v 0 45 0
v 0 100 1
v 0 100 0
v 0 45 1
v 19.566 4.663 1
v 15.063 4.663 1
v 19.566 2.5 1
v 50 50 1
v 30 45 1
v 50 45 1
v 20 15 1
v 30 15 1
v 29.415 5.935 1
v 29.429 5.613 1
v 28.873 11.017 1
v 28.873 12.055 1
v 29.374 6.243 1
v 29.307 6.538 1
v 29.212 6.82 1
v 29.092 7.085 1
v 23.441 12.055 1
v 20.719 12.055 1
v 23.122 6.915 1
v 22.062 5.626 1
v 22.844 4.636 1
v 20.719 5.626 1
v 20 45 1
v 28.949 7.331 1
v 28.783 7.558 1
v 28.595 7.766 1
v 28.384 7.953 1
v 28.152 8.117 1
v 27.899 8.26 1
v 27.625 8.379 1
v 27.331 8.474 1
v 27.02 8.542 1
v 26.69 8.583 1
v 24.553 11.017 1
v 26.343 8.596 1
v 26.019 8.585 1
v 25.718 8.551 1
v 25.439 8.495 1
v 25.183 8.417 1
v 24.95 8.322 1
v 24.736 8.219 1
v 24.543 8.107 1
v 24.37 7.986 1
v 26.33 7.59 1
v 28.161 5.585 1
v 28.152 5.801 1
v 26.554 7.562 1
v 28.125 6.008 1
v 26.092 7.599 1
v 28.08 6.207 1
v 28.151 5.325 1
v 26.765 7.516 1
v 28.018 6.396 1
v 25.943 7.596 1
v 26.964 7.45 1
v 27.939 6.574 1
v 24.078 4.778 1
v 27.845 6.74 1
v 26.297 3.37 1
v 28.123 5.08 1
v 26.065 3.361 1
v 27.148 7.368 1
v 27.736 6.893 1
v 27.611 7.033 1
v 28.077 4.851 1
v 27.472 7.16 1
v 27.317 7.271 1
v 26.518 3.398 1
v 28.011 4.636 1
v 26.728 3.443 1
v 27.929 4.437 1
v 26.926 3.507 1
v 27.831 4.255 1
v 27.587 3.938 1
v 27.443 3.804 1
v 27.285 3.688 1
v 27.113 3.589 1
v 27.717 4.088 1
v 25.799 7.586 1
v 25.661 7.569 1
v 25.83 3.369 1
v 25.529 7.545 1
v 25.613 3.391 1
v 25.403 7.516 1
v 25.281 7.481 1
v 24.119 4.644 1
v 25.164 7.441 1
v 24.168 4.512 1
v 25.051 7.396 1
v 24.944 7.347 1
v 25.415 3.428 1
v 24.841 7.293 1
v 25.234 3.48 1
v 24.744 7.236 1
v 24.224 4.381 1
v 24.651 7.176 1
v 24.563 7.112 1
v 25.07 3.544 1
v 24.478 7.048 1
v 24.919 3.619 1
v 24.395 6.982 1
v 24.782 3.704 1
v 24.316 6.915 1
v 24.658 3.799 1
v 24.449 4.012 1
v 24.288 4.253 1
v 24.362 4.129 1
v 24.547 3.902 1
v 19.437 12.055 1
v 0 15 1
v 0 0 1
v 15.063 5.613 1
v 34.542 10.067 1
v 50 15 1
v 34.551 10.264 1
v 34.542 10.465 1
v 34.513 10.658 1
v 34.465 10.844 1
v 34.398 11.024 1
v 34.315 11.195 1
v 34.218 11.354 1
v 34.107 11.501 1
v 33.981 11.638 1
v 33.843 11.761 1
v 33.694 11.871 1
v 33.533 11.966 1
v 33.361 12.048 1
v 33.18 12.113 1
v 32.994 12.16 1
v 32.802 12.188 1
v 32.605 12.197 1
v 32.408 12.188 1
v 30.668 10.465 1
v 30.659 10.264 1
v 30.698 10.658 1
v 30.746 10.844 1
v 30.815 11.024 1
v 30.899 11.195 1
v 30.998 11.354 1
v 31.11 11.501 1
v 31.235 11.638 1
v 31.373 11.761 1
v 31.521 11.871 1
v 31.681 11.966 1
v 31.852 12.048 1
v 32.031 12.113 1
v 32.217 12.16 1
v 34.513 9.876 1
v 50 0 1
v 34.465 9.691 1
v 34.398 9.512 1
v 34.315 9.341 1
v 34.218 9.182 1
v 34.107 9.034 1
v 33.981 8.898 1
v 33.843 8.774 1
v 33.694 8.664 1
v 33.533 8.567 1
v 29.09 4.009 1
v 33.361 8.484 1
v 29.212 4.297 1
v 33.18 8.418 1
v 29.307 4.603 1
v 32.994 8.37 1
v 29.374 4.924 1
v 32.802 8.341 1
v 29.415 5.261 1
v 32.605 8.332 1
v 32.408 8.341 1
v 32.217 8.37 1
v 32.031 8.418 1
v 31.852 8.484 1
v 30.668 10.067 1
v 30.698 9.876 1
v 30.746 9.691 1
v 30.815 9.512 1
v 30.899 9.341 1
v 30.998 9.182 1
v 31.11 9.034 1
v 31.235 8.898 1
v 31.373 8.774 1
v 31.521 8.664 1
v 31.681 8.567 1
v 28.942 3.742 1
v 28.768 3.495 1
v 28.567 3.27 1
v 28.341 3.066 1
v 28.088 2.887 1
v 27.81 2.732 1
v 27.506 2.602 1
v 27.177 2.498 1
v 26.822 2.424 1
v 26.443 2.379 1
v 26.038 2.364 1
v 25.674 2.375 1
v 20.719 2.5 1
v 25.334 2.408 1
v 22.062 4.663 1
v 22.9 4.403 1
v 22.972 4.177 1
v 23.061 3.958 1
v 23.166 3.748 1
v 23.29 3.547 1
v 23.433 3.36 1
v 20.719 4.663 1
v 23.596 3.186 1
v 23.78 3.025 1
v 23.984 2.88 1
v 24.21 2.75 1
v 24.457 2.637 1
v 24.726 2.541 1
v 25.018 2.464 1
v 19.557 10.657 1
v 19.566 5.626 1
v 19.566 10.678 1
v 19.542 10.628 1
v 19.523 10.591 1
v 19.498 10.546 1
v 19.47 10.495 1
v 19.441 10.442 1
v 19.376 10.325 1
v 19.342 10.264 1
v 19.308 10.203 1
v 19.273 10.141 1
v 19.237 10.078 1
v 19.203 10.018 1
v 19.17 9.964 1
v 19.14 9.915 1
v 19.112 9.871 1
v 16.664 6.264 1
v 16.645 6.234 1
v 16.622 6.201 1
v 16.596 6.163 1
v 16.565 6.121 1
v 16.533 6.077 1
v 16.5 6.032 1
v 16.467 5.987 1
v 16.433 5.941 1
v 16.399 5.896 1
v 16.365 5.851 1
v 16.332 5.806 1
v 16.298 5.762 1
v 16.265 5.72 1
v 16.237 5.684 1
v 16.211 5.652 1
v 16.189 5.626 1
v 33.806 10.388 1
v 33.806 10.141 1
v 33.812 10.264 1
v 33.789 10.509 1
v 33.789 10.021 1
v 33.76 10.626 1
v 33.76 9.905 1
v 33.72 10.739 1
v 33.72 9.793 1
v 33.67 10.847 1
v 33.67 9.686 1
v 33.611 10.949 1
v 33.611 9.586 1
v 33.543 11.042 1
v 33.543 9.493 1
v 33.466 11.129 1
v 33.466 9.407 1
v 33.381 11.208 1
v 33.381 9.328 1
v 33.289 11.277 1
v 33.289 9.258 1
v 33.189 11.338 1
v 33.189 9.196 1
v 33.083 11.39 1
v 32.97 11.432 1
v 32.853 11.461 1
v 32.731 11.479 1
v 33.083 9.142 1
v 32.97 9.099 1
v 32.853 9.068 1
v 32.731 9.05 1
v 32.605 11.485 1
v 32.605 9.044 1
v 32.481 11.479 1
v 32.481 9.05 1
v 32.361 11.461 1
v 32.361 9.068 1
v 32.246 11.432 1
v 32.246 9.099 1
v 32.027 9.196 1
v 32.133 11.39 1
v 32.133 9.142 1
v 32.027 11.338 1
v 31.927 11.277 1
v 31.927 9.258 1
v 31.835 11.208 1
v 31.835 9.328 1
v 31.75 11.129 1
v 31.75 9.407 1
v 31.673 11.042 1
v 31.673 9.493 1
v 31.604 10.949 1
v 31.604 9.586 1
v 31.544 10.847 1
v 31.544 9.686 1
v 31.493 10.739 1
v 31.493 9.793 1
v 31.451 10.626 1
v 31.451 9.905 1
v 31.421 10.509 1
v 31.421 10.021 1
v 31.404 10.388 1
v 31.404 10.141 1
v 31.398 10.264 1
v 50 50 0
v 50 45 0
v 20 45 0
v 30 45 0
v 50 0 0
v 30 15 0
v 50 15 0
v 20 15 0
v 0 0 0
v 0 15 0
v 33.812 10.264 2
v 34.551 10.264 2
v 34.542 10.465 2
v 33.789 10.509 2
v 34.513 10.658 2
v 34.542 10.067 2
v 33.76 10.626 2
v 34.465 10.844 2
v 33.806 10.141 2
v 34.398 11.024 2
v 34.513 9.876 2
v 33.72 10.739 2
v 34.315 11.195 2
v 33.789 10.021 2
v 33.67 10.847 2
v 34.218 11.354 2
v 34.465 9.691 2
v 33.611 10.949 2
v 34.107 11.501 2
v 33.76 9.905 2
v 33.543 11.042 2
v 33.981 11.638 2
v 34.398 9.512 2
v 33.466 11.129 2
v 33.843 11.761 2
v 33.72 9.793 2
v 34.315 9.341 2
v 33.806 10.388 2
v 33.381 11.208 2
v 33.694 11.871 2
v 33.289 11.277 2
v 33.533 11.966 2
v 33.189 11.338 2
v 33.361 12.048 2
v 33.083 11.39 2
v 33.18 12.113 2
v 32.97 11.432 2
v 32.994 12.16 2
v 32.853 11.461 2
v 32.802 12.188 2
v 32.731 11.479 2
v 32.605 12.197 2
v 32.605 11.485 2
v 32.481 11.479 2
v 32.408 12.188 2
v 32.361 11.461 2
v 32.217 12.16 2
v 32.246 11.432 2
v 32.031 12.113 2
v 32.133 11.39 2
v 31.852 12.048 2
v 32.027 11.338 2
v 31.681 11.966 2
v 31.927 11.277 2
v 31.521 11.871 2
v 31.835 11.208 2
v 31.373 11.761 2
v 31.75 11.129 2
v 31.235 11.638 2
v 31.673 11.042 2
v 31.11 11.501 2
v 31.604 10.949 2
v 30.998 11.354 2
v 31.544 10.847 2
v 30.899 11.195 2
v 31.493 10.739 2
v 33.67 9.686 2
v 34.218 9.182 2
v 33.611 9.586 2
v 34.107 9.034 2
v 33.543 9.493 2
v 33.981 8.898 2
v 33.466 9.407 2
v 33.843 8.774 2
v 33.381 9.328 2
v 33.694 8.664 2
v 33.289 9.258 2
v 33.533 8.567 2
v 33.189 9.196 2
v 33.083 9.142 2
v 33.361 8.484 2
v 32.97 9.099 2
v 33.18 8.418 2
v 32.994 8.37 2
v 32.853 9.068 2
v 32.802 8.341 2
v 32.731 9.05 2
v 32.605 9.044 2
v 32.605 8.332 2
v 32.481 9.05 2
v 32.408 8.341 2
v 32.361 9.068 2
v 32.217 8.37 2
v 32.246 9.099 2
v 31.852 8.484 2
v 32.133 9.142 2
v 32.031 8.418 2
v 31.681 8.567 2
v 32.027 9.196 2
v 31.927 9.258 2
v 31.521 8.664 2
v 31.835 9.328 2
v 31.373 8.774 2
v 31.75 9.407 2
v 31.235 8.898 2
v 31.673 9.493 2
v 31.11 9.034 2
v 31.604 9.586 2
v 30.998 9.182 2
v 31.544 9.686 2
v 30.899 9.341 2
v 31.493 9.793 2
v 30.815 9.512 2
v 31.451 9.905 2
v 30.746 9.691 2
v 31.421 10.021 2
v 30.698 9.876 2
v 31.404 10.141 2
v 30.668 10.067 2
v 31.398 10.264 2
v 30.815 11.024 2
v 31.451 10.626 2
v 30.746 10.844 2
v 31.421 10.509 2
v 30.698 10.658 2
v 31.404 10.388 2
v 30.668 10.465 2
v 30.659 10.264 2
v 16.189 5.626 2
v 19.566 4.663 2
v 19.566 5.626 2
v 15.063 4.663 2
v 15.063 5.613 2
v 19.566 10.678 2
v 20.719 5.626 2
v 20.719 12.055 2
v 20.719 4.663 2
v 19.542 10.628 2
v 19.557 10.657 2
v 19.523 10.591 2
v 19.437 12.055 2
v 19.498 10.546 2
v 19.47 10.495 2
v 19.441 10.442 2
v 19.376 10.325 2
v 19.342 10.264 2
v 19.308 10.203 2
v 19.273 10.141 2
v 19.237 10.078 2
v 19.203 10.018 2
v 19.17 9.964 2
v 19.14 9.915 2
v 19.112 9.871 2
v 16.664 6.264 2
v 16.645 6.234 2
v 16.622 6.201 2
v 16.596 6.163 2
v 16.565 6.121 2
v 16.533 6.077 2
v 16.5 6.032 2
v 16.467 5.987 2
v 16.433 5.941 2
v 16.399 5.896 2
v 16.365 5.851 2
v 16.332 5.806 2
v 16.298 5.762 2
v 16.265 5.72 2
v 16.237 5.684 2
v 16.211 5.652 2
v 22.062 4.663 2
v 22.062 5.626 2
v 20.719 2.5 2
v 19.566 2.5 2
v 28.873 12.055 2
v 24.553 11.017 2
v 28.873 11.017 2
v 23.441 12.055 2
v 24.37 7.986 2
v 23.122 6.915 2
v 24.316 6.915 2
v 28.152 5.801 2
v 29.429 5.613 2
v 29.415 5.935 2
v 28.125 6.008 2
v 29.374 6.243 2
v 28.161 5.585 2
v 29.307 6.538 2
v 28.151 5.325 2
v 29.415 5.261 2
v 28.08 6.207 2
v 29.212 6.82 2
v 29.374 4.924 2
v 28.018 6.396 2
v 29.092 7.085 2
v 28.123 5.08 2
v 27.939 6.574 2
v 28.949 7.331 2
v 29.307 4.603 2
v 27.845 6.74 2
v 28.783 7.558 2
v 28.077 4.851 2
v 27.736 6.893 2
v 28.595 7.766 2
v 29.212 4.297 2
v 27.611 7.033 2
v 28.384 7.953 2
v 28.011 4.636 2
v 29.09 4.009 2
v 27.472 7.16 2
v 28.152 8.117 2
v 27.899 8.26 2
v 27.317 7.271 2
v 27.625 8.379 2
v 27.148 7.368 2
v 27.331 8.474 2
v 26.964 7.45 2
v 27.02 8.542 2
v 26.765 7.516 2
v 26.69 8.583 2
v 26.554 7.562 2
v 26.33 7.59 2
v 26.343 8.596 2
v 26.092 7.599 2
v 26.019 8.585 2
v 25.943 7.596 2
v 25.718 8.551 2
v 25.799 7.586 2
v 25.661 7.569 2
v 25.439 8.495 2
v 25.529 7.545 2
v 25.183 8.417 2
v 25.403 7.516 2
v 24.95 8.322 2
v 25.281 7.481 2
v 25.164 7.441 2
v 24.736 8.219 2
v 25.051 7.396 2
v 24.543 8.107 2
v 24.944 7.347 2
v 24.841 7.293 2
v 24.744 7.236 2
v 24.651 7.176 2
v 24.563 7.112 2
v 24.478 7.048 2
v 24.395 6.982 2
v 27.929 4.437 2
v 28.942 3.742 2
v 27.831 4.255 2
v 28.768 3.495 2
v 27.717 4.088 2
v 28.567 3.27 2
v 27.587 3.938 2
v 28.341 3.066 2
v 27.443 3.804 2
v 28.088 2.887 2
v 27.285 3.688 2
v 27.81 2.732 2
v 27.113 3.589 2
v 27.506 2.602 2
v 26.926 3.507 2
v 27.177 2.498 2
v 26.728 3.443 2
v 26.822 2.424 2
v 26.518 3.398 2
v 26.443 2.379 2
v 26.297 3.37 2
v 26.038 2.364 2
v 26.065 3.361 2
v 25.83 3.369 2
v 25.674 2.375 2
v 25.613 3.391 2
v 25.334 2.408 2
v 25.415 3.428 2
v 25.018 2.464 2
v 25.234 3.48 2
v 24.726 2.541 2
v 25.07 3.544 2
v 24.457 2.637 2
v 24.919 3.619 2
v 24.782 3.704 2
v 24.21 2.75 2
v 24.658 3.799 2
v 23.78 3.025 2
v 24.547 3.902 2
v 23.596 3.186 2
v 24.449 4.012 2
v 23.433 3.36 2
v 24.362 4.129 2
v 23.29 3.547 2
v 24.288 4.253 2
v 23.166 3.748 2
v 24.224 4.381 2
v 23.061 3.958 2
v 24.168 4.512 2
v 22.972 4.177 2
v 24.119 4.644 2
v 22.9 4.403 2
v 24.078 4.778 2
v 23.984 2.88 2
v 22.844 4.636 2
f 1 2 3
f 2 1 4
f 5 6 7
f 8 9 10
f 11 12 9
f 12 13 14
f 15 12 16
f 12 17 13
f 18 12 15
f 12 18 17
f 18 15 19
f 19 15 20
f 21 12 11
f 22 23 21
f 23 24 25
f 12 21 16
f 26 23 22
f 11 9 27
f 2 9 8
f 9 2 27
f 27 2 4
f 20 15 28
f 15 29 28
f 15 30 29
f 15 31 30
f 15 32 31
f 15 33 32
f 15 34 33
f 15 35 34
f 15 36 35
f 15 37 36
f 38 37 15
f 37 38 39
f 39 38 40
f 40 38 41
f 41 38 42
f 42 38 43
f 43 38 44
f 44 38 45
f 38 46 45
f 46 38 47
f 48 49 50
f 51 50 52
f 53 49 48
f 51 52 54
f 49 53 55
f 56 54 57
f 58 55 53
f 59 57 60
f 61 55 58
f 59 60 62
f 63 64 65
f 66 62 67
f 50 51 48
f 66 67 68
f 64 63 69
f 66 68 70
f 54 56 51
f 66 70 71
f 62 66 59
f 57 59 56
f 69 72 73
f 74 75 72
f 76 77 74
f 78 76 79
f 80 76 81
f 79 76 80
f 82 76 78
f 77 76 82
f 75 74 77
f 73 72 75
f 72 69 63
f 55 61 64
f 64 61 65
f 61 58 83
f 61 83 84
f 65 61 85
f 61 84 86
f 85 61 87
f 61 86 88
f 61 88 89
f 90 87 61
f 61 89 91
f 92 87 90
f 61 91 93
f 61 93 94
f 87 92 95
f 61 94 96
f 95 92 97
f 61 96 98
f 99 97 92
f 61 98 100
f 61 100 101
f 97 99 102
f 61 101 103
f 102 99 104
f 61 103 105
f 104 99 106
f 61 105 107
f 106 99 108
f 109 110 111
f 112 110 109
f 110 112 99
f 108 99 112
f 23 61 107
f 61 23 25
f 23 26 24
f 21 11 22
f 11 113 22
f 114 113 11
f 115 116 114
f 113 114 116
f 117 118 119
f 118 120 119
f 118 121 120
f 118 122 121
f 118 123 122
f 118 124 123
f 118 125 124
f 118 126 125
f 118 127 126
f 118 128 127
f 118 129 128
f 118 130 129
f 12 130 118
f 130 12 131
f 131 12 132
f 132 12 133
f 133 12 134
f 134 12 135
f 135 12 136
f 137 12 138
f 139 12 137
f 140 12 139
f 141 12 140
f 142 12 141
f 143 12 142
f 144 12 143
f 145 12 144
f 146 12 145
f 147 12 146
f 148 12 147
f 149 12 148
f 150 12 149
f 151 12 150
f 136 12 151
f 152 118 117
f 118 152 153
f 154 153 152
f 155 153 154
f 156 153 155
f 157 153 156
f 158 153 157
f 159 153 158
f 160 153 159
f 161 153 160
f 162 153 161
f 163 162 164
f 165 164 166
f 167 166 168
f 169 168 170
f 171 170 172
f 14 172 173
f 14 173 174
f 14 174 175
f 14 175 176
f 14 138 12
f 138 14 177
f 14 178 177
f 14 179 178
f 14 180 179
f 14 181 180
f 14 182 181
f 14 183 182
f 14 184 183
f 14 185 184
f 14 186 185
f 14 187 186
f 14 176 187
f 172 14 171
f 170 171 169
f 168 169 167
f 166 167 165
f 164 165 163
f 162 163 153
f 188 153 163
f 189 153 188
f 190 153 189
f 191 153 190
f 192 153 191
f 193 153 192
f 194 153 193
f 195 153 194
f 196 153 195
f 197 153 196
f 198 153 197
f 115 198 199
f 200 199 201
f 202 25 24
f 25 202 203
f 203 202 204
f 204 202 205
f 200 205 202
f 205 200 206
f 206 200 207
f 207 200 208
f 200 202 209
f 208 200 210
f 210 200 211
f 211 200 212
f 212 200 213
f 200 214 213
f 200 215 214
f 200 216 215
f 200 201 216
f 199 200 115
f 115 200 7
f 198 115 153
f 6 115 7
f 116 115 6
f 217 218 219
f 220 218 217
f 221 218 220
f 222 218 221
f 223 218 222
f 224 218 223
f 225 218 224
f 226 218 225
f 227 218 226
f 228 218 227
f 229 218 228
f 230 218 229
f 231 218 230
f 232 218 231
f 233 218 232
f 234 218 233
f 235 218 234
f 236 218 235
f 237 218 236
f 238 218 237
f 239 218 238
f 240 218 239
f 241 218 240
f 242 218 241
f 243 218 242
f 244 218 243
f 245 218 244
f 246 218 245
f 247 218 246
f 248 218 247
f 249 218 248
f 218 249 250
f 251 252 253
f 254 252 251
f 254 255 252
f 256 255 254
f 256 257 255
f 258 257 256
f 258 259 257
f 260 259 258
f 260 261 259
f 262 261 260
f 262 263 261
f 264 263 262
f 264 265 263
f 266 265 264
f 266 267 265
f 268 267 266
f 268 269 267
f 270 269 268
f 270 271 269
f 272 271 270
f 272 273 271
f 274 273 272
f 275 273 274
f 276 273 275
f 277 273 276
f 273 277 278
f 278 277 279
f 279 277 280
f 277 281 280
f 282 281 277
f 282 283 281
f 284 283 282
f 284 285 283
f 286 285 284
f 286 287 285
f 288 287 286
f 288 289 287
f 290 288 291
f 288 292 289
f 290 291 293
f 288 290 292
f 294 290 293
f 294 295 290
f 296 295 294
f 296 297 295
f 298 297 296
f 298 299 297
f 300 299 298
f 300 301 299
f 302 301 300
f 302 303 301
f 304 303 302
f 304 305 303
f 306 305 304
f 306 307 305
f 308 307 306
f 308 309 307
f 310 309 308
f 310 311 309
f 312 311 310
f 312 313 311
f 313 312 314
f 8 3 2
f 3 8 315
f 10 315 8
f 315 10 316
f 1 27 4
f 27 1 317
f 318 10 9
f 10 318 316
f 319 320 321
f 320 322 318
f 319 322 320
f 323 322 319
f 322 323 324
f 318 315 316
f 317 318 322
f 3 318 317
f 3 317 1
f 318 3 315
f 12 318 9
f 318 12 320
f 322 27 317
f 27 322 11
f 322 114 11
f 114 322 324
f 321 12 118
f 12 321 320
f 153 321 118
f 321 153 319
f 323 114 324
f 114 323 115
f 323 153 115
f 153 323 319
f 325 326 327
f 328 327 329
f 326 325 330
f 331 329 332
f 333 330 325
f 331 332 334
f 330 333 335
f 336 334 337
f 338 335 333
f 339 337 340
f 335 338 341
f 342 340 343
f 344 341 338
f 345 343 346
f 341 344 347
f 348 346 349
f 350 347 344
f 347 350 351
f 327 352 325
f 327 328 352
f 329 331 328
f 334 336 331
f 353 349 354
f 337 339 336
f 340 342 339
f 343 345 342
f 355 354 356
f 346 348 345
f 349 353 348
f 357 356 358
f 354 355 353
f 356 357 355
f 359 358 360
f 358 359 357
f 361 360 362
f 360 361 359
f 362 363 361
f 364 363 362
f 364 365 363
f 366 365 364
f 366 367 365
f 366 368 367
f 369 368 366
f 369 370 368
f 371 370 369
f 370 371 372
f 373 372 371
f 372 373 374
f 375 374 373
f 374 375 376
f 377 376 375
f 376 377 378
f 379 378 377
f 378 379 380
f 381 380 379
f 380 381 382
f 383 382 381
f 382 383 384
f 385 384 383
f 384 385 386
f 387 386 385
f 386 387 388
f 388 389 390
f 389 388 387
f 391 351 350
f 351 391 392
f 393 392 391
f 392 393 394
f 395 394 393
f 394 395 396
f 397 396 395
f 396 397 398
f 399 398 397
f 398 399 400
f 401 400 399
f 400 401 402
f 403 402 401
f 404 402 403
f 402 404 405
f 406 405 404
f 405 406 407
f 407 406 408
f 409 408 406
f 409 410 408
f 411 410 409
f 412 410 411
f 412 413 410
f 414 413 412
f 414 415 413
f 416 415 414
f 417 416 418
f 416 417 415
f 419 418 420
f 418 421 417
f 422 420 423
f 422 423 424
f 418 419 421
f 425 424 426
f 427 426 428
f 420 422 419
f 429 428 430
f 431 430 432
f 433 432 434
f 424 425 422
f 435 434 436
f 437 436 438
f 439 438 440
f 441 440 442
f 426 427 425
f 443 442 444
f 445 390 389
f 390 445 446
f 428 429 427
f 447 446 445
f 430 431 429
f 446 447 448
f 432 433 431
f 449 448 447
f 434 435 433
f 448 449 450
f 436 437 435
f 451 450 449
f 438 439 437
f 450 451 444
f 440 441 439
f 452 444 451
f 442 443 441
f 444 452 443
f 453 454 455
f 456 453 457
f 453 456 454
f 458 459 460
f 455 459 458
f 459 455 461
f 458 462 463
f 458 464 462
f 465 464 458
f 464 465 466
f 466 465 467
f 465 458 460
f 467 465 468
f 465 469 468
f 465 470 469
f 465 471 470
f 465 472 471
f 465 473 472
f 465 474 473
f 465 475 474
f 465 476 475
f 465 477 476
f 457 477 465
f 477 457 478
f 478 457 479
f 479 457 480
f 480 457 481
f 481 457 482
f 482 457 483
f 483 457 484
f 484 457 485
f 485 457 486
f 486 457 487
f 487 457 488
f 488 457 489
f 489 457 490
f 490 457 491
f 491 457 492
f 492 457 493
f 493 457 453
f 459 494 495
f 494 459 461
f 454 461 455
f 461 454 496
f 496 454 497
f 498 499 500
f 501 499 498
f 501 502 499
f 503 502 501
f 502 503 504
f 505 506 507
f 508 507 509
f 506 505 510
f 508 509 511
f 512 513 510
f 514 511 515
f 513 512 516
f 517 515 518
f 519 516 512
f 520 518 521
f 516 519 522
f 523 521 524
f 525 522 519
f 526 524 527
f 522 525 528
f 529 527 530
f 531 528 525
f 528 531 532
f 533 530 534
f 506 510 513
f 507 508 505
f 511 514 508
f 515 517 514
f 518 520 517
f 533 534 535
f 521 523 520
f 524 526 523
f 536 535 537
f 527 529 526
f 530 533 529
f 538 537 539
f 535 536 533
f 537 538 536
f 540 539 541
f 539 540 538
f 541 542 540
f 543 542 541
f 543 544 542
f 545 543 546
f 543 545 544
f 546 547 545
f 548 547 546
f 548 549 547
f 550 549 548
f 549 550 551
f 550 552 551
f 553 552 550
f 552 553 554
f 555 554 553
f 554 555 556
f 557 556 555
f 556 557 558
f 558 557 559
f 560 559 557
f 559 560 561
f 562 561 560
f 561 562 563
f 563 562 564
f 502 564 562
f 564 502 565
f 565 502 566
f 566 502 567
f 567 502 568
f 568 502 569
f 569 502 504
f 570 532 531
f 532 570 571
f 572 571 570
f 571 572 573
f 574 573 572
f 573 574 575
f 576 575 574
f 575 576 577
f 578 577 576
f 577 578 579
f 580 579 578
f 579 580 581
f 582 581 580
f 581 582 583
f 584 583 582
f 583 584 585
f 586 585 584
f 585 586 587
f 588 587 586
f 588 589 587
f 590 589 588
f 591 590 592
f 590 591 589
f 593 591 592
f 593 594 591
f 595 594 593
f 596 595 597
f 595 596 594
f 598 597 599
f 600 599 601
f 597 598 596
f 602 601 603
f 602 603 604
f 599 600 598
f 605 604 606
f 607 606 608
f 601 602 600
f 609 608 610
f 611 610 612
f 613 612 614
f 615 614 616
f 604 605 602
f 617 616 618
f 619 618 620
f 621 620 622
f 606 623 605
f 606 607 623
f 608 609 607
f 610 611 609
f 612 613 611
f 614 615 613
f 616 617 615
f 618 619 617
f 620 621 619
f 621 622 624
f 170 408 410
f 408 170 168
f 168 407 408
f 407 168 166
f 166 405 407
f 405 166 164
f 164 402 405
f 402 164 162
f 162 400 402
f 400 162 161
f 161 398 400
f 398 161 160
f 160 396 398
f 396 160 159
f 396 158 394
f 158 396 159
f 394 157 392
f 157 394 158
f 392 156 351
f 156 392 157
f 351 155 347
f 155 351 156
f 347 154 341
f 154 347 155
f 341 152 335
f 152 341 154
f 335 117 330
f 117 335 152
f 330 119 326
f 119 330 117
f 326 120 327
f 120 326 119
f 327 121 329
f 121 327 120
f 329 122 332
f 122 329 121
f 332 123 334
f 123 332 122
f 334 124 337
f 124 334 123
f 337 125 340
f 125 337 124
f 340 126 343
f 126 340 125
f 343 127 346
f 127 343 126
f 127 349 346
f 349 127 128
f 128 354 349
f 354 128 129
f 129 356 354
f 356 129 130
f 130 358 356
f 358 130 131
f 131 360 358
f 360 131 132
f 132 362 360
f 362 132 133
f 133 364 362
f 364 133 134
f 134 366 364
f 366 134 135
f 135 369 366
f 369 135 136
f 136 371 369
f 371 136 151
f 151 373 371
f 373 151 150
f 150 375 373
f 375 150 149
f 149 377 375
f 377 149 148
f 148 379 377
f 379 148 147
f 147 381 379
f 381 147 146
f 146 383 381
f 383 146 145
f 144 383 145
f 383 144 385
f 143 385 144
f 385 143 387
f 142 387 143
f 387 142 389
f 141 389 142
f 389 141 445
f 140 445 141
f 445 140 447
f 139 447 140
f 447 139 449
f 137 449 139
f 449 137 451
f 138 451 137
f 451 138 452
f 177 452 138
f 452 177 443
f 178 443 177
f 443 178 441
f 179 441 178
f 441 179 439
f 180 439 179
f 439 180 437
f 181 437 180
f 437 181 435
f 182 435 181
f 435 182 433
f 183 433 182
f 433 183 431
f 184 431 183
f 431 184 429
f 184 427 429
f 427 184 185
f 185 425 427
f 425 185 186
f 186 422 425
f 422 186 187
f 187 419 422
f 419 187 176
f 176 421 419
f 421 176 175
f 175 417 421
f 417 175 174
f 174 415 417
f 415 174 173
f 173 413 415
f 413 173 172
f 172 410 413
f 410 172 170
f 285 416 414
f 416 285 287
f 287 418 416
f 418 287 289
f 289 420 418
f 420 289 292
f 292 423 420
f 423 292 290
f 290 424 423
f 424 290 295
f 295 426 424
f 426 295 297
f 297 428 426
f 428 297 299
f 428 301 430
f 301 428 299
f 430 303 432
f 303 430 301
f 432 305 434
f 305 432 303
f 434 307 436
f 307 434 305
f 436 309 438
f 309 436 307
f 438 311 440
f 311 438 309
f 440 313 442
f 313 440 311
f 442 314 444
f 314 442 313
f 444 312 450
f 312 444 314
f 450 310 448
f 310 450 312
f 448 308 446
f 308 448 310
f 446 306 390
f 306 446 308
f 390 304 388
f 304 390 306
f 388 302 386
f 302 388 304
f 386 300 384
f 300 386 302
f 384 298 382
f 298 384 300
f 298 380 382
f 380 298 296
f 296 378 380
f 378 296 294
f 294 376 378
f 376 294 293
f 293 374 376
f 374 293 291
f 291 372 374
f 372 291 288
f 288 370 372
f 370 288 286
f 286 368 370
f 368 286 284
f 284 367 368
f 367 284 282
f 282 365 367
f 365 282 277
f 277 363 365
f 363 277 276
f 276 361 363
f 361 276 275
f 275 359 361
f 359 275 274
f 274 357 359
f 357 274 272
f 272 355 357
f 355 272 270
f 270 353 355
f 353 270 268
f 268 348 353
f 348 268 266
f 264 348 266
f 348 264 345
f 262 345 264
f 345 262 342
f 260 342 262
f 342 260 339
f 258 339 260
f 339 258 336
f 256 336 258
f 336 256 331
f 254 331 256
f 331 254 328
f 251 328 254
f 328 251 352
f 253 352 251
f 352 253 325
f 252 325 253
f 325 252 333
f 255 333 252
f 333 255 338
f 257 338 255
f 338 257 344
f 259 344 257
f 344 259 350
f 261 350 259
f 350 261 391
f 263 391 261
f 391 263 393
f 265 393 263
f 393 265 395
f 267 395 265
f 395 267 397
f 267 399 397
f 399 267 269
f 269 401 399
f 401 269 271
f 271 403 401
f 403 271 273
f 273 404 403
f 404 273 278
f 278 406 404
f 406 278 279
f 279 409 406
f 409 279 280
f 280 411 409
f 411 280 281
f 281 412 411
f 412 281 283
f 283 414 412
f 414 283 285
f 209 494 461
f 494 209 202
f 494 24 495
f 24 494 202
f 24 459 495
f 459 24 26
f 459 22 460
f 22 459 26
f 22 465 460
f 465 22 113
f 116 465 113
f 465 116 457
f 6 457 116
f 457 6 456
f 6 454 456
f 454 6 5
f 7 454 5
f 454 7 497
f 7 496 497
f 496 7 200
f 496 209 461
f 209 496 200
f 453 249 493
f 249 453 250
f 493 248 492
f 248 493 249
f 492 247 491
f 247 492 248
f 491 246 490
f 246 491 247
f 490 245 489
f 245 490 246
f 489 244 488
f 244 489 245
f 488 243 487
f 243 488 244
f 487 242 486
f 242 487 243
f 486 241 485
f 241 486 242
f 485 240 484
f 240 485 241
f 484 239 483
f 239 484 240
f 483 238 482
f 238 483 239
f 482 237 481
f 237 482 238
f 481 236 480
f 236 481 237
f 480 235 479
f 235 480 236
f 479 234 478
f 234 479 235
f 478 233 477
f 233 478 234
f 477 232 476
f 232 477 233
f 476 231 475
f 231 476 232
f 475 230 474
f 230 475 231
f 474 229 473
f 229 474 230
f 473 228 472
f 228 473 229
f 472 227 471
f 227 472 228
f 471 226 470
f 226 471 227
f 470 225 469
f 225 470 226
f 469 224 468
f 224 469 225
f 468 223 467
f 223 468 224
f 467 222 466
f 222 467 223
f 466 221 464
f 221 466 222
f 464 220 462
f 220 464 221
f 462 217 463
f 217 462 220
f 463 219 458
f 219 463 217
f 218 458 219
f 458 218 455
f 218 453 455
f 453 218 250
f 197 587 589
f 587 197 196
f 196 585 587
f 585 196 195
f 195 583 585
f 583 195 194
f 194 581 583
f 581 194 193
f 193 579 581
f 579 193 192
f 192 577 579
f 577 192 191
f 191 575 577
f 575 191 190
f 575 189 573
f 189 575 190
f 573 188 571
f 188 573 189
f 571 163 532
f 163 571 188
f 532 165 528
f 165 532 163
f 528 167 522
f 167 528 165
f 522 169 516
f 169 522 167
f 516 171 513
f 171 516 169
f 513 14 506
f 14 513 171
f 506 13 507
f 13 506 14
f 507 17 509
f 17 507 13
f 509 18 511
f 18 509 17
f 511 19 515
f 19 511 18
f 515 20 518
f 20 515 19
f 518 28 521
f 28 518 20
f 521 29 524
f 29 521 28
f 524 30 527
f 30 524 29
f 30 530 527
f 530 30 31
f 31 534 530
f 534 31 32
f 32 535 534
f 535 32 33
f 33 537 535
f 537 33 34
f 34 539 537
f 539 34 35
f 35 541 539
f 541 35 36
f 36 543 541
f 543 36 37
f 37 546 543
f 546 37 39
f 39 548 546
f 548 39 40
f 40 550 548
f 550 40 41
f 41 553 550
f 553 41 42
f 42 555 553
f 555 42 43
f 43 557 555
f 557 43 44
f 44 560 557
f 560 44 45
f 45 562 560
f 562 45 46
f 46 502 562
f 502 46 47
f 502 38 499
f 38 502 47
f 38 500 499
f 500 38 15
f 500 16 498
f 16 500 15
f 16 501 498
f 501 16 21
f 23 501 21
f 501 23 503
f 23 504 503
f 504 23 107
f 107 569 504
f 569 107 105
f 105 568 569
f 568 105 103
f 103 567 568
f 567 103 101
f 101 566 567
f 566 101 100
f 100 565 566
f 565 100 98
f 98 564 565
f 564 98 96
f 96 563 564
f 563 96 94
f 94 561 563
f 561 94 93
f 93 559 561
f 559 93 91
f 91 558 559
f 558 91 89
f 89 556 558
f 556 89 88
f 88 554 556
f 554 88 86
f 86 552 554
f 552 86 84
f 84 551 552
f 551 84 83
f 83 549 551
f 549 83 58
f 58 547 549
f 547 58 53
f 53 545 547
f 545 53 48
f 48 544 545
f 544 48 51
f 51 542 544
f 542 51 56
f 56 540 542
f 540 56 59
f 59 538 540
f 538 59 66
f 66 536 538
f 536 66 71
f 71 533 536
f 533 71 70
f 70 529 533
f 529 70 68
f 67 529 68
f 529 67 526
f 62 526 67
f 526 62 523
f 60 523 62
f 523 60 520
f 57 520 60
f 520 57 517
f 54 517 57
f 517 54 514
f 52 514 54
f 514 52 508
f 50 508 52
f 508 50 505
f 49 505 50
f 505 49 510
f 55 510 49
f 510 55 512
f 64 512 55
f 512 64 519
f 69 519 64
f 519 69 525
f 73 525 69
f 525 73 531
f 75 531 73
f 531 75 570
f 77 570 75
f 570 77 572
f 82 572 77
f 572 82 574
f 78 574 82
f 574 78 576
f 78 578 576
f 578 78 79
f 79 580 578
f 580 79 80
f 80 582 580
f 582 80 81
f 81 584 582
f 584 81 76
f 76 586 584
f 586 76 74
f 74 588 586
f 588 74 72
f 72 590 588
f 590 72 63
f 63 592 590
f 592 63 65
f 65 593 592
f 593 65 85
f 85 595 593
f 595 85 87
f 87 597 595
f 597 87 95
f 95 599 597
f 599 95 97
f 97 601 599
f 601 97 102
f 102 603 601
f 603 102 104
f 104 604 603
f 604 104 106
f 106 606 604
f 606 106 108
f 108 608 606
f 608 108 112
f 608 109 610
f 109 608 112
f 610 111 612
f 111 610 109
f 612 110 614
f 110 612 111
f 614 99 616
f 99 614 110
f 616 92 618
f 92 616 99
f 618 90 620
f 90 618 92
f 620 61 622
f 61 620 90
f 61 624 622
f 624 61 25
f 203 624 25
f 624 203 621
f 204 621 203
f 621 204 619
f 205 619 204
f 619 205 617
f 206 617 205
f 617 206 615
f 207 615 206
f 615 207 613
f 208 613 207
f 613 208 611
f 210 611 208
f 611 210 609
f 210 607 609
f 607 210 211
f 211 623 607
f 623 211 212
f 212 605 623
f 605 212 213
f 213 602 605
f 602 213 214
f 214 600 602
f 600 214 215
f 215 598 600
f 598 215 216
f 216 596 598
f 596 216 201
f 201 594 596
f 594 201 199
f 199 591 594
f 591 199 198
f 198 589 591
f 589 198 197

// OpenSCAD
// Degree of the ruler
degree=45; //[15:80]

// Width of the ruler
width=50;

// Length of the connector between alignment base and angled ruler
connector_length=30;

// Thickness of the ruler.
thickness=1;

/* [Text] */

// Do you want to add degree as text to the ruler
show_text = 1; //[1:Yes,0:No]

// Thinckness of the text
text_thickness = 1;

/* [Advanced] */

// Length of the base that helps with alignment.
base_length = 15;

// Width of the base to angled ruler connector
connector_width = 10;

// Notch on the side of the ruler. Helps to maintain ruler alignment. Additionally, it helps while printing as extremely thin parts do not print good enough.
ruler_notch = 5;

/* [Hidden] */

translate([0, connector_length+base_length, 0])
linear_extrude(thickness)
polygon([
    [0,0], 
    [width,0],
    [width, ruler_notch],
    [0,ruler_notch+tan(degree)*width]
]);

//Connector
translate([(width-connector_width)/2,base_length,0])
cube([connector_width,connector_length,thickness]);

//Base
cube([width,base_length,thickness]);

//Text
if(show_text) {
    translate([width/2, base_length/3/2, 0])
    linear_extrude(thickness+text_thickness)
    scale([base_length/15, base_length/15, 1])
    text(str(degree, "°"), halign="center");
}
